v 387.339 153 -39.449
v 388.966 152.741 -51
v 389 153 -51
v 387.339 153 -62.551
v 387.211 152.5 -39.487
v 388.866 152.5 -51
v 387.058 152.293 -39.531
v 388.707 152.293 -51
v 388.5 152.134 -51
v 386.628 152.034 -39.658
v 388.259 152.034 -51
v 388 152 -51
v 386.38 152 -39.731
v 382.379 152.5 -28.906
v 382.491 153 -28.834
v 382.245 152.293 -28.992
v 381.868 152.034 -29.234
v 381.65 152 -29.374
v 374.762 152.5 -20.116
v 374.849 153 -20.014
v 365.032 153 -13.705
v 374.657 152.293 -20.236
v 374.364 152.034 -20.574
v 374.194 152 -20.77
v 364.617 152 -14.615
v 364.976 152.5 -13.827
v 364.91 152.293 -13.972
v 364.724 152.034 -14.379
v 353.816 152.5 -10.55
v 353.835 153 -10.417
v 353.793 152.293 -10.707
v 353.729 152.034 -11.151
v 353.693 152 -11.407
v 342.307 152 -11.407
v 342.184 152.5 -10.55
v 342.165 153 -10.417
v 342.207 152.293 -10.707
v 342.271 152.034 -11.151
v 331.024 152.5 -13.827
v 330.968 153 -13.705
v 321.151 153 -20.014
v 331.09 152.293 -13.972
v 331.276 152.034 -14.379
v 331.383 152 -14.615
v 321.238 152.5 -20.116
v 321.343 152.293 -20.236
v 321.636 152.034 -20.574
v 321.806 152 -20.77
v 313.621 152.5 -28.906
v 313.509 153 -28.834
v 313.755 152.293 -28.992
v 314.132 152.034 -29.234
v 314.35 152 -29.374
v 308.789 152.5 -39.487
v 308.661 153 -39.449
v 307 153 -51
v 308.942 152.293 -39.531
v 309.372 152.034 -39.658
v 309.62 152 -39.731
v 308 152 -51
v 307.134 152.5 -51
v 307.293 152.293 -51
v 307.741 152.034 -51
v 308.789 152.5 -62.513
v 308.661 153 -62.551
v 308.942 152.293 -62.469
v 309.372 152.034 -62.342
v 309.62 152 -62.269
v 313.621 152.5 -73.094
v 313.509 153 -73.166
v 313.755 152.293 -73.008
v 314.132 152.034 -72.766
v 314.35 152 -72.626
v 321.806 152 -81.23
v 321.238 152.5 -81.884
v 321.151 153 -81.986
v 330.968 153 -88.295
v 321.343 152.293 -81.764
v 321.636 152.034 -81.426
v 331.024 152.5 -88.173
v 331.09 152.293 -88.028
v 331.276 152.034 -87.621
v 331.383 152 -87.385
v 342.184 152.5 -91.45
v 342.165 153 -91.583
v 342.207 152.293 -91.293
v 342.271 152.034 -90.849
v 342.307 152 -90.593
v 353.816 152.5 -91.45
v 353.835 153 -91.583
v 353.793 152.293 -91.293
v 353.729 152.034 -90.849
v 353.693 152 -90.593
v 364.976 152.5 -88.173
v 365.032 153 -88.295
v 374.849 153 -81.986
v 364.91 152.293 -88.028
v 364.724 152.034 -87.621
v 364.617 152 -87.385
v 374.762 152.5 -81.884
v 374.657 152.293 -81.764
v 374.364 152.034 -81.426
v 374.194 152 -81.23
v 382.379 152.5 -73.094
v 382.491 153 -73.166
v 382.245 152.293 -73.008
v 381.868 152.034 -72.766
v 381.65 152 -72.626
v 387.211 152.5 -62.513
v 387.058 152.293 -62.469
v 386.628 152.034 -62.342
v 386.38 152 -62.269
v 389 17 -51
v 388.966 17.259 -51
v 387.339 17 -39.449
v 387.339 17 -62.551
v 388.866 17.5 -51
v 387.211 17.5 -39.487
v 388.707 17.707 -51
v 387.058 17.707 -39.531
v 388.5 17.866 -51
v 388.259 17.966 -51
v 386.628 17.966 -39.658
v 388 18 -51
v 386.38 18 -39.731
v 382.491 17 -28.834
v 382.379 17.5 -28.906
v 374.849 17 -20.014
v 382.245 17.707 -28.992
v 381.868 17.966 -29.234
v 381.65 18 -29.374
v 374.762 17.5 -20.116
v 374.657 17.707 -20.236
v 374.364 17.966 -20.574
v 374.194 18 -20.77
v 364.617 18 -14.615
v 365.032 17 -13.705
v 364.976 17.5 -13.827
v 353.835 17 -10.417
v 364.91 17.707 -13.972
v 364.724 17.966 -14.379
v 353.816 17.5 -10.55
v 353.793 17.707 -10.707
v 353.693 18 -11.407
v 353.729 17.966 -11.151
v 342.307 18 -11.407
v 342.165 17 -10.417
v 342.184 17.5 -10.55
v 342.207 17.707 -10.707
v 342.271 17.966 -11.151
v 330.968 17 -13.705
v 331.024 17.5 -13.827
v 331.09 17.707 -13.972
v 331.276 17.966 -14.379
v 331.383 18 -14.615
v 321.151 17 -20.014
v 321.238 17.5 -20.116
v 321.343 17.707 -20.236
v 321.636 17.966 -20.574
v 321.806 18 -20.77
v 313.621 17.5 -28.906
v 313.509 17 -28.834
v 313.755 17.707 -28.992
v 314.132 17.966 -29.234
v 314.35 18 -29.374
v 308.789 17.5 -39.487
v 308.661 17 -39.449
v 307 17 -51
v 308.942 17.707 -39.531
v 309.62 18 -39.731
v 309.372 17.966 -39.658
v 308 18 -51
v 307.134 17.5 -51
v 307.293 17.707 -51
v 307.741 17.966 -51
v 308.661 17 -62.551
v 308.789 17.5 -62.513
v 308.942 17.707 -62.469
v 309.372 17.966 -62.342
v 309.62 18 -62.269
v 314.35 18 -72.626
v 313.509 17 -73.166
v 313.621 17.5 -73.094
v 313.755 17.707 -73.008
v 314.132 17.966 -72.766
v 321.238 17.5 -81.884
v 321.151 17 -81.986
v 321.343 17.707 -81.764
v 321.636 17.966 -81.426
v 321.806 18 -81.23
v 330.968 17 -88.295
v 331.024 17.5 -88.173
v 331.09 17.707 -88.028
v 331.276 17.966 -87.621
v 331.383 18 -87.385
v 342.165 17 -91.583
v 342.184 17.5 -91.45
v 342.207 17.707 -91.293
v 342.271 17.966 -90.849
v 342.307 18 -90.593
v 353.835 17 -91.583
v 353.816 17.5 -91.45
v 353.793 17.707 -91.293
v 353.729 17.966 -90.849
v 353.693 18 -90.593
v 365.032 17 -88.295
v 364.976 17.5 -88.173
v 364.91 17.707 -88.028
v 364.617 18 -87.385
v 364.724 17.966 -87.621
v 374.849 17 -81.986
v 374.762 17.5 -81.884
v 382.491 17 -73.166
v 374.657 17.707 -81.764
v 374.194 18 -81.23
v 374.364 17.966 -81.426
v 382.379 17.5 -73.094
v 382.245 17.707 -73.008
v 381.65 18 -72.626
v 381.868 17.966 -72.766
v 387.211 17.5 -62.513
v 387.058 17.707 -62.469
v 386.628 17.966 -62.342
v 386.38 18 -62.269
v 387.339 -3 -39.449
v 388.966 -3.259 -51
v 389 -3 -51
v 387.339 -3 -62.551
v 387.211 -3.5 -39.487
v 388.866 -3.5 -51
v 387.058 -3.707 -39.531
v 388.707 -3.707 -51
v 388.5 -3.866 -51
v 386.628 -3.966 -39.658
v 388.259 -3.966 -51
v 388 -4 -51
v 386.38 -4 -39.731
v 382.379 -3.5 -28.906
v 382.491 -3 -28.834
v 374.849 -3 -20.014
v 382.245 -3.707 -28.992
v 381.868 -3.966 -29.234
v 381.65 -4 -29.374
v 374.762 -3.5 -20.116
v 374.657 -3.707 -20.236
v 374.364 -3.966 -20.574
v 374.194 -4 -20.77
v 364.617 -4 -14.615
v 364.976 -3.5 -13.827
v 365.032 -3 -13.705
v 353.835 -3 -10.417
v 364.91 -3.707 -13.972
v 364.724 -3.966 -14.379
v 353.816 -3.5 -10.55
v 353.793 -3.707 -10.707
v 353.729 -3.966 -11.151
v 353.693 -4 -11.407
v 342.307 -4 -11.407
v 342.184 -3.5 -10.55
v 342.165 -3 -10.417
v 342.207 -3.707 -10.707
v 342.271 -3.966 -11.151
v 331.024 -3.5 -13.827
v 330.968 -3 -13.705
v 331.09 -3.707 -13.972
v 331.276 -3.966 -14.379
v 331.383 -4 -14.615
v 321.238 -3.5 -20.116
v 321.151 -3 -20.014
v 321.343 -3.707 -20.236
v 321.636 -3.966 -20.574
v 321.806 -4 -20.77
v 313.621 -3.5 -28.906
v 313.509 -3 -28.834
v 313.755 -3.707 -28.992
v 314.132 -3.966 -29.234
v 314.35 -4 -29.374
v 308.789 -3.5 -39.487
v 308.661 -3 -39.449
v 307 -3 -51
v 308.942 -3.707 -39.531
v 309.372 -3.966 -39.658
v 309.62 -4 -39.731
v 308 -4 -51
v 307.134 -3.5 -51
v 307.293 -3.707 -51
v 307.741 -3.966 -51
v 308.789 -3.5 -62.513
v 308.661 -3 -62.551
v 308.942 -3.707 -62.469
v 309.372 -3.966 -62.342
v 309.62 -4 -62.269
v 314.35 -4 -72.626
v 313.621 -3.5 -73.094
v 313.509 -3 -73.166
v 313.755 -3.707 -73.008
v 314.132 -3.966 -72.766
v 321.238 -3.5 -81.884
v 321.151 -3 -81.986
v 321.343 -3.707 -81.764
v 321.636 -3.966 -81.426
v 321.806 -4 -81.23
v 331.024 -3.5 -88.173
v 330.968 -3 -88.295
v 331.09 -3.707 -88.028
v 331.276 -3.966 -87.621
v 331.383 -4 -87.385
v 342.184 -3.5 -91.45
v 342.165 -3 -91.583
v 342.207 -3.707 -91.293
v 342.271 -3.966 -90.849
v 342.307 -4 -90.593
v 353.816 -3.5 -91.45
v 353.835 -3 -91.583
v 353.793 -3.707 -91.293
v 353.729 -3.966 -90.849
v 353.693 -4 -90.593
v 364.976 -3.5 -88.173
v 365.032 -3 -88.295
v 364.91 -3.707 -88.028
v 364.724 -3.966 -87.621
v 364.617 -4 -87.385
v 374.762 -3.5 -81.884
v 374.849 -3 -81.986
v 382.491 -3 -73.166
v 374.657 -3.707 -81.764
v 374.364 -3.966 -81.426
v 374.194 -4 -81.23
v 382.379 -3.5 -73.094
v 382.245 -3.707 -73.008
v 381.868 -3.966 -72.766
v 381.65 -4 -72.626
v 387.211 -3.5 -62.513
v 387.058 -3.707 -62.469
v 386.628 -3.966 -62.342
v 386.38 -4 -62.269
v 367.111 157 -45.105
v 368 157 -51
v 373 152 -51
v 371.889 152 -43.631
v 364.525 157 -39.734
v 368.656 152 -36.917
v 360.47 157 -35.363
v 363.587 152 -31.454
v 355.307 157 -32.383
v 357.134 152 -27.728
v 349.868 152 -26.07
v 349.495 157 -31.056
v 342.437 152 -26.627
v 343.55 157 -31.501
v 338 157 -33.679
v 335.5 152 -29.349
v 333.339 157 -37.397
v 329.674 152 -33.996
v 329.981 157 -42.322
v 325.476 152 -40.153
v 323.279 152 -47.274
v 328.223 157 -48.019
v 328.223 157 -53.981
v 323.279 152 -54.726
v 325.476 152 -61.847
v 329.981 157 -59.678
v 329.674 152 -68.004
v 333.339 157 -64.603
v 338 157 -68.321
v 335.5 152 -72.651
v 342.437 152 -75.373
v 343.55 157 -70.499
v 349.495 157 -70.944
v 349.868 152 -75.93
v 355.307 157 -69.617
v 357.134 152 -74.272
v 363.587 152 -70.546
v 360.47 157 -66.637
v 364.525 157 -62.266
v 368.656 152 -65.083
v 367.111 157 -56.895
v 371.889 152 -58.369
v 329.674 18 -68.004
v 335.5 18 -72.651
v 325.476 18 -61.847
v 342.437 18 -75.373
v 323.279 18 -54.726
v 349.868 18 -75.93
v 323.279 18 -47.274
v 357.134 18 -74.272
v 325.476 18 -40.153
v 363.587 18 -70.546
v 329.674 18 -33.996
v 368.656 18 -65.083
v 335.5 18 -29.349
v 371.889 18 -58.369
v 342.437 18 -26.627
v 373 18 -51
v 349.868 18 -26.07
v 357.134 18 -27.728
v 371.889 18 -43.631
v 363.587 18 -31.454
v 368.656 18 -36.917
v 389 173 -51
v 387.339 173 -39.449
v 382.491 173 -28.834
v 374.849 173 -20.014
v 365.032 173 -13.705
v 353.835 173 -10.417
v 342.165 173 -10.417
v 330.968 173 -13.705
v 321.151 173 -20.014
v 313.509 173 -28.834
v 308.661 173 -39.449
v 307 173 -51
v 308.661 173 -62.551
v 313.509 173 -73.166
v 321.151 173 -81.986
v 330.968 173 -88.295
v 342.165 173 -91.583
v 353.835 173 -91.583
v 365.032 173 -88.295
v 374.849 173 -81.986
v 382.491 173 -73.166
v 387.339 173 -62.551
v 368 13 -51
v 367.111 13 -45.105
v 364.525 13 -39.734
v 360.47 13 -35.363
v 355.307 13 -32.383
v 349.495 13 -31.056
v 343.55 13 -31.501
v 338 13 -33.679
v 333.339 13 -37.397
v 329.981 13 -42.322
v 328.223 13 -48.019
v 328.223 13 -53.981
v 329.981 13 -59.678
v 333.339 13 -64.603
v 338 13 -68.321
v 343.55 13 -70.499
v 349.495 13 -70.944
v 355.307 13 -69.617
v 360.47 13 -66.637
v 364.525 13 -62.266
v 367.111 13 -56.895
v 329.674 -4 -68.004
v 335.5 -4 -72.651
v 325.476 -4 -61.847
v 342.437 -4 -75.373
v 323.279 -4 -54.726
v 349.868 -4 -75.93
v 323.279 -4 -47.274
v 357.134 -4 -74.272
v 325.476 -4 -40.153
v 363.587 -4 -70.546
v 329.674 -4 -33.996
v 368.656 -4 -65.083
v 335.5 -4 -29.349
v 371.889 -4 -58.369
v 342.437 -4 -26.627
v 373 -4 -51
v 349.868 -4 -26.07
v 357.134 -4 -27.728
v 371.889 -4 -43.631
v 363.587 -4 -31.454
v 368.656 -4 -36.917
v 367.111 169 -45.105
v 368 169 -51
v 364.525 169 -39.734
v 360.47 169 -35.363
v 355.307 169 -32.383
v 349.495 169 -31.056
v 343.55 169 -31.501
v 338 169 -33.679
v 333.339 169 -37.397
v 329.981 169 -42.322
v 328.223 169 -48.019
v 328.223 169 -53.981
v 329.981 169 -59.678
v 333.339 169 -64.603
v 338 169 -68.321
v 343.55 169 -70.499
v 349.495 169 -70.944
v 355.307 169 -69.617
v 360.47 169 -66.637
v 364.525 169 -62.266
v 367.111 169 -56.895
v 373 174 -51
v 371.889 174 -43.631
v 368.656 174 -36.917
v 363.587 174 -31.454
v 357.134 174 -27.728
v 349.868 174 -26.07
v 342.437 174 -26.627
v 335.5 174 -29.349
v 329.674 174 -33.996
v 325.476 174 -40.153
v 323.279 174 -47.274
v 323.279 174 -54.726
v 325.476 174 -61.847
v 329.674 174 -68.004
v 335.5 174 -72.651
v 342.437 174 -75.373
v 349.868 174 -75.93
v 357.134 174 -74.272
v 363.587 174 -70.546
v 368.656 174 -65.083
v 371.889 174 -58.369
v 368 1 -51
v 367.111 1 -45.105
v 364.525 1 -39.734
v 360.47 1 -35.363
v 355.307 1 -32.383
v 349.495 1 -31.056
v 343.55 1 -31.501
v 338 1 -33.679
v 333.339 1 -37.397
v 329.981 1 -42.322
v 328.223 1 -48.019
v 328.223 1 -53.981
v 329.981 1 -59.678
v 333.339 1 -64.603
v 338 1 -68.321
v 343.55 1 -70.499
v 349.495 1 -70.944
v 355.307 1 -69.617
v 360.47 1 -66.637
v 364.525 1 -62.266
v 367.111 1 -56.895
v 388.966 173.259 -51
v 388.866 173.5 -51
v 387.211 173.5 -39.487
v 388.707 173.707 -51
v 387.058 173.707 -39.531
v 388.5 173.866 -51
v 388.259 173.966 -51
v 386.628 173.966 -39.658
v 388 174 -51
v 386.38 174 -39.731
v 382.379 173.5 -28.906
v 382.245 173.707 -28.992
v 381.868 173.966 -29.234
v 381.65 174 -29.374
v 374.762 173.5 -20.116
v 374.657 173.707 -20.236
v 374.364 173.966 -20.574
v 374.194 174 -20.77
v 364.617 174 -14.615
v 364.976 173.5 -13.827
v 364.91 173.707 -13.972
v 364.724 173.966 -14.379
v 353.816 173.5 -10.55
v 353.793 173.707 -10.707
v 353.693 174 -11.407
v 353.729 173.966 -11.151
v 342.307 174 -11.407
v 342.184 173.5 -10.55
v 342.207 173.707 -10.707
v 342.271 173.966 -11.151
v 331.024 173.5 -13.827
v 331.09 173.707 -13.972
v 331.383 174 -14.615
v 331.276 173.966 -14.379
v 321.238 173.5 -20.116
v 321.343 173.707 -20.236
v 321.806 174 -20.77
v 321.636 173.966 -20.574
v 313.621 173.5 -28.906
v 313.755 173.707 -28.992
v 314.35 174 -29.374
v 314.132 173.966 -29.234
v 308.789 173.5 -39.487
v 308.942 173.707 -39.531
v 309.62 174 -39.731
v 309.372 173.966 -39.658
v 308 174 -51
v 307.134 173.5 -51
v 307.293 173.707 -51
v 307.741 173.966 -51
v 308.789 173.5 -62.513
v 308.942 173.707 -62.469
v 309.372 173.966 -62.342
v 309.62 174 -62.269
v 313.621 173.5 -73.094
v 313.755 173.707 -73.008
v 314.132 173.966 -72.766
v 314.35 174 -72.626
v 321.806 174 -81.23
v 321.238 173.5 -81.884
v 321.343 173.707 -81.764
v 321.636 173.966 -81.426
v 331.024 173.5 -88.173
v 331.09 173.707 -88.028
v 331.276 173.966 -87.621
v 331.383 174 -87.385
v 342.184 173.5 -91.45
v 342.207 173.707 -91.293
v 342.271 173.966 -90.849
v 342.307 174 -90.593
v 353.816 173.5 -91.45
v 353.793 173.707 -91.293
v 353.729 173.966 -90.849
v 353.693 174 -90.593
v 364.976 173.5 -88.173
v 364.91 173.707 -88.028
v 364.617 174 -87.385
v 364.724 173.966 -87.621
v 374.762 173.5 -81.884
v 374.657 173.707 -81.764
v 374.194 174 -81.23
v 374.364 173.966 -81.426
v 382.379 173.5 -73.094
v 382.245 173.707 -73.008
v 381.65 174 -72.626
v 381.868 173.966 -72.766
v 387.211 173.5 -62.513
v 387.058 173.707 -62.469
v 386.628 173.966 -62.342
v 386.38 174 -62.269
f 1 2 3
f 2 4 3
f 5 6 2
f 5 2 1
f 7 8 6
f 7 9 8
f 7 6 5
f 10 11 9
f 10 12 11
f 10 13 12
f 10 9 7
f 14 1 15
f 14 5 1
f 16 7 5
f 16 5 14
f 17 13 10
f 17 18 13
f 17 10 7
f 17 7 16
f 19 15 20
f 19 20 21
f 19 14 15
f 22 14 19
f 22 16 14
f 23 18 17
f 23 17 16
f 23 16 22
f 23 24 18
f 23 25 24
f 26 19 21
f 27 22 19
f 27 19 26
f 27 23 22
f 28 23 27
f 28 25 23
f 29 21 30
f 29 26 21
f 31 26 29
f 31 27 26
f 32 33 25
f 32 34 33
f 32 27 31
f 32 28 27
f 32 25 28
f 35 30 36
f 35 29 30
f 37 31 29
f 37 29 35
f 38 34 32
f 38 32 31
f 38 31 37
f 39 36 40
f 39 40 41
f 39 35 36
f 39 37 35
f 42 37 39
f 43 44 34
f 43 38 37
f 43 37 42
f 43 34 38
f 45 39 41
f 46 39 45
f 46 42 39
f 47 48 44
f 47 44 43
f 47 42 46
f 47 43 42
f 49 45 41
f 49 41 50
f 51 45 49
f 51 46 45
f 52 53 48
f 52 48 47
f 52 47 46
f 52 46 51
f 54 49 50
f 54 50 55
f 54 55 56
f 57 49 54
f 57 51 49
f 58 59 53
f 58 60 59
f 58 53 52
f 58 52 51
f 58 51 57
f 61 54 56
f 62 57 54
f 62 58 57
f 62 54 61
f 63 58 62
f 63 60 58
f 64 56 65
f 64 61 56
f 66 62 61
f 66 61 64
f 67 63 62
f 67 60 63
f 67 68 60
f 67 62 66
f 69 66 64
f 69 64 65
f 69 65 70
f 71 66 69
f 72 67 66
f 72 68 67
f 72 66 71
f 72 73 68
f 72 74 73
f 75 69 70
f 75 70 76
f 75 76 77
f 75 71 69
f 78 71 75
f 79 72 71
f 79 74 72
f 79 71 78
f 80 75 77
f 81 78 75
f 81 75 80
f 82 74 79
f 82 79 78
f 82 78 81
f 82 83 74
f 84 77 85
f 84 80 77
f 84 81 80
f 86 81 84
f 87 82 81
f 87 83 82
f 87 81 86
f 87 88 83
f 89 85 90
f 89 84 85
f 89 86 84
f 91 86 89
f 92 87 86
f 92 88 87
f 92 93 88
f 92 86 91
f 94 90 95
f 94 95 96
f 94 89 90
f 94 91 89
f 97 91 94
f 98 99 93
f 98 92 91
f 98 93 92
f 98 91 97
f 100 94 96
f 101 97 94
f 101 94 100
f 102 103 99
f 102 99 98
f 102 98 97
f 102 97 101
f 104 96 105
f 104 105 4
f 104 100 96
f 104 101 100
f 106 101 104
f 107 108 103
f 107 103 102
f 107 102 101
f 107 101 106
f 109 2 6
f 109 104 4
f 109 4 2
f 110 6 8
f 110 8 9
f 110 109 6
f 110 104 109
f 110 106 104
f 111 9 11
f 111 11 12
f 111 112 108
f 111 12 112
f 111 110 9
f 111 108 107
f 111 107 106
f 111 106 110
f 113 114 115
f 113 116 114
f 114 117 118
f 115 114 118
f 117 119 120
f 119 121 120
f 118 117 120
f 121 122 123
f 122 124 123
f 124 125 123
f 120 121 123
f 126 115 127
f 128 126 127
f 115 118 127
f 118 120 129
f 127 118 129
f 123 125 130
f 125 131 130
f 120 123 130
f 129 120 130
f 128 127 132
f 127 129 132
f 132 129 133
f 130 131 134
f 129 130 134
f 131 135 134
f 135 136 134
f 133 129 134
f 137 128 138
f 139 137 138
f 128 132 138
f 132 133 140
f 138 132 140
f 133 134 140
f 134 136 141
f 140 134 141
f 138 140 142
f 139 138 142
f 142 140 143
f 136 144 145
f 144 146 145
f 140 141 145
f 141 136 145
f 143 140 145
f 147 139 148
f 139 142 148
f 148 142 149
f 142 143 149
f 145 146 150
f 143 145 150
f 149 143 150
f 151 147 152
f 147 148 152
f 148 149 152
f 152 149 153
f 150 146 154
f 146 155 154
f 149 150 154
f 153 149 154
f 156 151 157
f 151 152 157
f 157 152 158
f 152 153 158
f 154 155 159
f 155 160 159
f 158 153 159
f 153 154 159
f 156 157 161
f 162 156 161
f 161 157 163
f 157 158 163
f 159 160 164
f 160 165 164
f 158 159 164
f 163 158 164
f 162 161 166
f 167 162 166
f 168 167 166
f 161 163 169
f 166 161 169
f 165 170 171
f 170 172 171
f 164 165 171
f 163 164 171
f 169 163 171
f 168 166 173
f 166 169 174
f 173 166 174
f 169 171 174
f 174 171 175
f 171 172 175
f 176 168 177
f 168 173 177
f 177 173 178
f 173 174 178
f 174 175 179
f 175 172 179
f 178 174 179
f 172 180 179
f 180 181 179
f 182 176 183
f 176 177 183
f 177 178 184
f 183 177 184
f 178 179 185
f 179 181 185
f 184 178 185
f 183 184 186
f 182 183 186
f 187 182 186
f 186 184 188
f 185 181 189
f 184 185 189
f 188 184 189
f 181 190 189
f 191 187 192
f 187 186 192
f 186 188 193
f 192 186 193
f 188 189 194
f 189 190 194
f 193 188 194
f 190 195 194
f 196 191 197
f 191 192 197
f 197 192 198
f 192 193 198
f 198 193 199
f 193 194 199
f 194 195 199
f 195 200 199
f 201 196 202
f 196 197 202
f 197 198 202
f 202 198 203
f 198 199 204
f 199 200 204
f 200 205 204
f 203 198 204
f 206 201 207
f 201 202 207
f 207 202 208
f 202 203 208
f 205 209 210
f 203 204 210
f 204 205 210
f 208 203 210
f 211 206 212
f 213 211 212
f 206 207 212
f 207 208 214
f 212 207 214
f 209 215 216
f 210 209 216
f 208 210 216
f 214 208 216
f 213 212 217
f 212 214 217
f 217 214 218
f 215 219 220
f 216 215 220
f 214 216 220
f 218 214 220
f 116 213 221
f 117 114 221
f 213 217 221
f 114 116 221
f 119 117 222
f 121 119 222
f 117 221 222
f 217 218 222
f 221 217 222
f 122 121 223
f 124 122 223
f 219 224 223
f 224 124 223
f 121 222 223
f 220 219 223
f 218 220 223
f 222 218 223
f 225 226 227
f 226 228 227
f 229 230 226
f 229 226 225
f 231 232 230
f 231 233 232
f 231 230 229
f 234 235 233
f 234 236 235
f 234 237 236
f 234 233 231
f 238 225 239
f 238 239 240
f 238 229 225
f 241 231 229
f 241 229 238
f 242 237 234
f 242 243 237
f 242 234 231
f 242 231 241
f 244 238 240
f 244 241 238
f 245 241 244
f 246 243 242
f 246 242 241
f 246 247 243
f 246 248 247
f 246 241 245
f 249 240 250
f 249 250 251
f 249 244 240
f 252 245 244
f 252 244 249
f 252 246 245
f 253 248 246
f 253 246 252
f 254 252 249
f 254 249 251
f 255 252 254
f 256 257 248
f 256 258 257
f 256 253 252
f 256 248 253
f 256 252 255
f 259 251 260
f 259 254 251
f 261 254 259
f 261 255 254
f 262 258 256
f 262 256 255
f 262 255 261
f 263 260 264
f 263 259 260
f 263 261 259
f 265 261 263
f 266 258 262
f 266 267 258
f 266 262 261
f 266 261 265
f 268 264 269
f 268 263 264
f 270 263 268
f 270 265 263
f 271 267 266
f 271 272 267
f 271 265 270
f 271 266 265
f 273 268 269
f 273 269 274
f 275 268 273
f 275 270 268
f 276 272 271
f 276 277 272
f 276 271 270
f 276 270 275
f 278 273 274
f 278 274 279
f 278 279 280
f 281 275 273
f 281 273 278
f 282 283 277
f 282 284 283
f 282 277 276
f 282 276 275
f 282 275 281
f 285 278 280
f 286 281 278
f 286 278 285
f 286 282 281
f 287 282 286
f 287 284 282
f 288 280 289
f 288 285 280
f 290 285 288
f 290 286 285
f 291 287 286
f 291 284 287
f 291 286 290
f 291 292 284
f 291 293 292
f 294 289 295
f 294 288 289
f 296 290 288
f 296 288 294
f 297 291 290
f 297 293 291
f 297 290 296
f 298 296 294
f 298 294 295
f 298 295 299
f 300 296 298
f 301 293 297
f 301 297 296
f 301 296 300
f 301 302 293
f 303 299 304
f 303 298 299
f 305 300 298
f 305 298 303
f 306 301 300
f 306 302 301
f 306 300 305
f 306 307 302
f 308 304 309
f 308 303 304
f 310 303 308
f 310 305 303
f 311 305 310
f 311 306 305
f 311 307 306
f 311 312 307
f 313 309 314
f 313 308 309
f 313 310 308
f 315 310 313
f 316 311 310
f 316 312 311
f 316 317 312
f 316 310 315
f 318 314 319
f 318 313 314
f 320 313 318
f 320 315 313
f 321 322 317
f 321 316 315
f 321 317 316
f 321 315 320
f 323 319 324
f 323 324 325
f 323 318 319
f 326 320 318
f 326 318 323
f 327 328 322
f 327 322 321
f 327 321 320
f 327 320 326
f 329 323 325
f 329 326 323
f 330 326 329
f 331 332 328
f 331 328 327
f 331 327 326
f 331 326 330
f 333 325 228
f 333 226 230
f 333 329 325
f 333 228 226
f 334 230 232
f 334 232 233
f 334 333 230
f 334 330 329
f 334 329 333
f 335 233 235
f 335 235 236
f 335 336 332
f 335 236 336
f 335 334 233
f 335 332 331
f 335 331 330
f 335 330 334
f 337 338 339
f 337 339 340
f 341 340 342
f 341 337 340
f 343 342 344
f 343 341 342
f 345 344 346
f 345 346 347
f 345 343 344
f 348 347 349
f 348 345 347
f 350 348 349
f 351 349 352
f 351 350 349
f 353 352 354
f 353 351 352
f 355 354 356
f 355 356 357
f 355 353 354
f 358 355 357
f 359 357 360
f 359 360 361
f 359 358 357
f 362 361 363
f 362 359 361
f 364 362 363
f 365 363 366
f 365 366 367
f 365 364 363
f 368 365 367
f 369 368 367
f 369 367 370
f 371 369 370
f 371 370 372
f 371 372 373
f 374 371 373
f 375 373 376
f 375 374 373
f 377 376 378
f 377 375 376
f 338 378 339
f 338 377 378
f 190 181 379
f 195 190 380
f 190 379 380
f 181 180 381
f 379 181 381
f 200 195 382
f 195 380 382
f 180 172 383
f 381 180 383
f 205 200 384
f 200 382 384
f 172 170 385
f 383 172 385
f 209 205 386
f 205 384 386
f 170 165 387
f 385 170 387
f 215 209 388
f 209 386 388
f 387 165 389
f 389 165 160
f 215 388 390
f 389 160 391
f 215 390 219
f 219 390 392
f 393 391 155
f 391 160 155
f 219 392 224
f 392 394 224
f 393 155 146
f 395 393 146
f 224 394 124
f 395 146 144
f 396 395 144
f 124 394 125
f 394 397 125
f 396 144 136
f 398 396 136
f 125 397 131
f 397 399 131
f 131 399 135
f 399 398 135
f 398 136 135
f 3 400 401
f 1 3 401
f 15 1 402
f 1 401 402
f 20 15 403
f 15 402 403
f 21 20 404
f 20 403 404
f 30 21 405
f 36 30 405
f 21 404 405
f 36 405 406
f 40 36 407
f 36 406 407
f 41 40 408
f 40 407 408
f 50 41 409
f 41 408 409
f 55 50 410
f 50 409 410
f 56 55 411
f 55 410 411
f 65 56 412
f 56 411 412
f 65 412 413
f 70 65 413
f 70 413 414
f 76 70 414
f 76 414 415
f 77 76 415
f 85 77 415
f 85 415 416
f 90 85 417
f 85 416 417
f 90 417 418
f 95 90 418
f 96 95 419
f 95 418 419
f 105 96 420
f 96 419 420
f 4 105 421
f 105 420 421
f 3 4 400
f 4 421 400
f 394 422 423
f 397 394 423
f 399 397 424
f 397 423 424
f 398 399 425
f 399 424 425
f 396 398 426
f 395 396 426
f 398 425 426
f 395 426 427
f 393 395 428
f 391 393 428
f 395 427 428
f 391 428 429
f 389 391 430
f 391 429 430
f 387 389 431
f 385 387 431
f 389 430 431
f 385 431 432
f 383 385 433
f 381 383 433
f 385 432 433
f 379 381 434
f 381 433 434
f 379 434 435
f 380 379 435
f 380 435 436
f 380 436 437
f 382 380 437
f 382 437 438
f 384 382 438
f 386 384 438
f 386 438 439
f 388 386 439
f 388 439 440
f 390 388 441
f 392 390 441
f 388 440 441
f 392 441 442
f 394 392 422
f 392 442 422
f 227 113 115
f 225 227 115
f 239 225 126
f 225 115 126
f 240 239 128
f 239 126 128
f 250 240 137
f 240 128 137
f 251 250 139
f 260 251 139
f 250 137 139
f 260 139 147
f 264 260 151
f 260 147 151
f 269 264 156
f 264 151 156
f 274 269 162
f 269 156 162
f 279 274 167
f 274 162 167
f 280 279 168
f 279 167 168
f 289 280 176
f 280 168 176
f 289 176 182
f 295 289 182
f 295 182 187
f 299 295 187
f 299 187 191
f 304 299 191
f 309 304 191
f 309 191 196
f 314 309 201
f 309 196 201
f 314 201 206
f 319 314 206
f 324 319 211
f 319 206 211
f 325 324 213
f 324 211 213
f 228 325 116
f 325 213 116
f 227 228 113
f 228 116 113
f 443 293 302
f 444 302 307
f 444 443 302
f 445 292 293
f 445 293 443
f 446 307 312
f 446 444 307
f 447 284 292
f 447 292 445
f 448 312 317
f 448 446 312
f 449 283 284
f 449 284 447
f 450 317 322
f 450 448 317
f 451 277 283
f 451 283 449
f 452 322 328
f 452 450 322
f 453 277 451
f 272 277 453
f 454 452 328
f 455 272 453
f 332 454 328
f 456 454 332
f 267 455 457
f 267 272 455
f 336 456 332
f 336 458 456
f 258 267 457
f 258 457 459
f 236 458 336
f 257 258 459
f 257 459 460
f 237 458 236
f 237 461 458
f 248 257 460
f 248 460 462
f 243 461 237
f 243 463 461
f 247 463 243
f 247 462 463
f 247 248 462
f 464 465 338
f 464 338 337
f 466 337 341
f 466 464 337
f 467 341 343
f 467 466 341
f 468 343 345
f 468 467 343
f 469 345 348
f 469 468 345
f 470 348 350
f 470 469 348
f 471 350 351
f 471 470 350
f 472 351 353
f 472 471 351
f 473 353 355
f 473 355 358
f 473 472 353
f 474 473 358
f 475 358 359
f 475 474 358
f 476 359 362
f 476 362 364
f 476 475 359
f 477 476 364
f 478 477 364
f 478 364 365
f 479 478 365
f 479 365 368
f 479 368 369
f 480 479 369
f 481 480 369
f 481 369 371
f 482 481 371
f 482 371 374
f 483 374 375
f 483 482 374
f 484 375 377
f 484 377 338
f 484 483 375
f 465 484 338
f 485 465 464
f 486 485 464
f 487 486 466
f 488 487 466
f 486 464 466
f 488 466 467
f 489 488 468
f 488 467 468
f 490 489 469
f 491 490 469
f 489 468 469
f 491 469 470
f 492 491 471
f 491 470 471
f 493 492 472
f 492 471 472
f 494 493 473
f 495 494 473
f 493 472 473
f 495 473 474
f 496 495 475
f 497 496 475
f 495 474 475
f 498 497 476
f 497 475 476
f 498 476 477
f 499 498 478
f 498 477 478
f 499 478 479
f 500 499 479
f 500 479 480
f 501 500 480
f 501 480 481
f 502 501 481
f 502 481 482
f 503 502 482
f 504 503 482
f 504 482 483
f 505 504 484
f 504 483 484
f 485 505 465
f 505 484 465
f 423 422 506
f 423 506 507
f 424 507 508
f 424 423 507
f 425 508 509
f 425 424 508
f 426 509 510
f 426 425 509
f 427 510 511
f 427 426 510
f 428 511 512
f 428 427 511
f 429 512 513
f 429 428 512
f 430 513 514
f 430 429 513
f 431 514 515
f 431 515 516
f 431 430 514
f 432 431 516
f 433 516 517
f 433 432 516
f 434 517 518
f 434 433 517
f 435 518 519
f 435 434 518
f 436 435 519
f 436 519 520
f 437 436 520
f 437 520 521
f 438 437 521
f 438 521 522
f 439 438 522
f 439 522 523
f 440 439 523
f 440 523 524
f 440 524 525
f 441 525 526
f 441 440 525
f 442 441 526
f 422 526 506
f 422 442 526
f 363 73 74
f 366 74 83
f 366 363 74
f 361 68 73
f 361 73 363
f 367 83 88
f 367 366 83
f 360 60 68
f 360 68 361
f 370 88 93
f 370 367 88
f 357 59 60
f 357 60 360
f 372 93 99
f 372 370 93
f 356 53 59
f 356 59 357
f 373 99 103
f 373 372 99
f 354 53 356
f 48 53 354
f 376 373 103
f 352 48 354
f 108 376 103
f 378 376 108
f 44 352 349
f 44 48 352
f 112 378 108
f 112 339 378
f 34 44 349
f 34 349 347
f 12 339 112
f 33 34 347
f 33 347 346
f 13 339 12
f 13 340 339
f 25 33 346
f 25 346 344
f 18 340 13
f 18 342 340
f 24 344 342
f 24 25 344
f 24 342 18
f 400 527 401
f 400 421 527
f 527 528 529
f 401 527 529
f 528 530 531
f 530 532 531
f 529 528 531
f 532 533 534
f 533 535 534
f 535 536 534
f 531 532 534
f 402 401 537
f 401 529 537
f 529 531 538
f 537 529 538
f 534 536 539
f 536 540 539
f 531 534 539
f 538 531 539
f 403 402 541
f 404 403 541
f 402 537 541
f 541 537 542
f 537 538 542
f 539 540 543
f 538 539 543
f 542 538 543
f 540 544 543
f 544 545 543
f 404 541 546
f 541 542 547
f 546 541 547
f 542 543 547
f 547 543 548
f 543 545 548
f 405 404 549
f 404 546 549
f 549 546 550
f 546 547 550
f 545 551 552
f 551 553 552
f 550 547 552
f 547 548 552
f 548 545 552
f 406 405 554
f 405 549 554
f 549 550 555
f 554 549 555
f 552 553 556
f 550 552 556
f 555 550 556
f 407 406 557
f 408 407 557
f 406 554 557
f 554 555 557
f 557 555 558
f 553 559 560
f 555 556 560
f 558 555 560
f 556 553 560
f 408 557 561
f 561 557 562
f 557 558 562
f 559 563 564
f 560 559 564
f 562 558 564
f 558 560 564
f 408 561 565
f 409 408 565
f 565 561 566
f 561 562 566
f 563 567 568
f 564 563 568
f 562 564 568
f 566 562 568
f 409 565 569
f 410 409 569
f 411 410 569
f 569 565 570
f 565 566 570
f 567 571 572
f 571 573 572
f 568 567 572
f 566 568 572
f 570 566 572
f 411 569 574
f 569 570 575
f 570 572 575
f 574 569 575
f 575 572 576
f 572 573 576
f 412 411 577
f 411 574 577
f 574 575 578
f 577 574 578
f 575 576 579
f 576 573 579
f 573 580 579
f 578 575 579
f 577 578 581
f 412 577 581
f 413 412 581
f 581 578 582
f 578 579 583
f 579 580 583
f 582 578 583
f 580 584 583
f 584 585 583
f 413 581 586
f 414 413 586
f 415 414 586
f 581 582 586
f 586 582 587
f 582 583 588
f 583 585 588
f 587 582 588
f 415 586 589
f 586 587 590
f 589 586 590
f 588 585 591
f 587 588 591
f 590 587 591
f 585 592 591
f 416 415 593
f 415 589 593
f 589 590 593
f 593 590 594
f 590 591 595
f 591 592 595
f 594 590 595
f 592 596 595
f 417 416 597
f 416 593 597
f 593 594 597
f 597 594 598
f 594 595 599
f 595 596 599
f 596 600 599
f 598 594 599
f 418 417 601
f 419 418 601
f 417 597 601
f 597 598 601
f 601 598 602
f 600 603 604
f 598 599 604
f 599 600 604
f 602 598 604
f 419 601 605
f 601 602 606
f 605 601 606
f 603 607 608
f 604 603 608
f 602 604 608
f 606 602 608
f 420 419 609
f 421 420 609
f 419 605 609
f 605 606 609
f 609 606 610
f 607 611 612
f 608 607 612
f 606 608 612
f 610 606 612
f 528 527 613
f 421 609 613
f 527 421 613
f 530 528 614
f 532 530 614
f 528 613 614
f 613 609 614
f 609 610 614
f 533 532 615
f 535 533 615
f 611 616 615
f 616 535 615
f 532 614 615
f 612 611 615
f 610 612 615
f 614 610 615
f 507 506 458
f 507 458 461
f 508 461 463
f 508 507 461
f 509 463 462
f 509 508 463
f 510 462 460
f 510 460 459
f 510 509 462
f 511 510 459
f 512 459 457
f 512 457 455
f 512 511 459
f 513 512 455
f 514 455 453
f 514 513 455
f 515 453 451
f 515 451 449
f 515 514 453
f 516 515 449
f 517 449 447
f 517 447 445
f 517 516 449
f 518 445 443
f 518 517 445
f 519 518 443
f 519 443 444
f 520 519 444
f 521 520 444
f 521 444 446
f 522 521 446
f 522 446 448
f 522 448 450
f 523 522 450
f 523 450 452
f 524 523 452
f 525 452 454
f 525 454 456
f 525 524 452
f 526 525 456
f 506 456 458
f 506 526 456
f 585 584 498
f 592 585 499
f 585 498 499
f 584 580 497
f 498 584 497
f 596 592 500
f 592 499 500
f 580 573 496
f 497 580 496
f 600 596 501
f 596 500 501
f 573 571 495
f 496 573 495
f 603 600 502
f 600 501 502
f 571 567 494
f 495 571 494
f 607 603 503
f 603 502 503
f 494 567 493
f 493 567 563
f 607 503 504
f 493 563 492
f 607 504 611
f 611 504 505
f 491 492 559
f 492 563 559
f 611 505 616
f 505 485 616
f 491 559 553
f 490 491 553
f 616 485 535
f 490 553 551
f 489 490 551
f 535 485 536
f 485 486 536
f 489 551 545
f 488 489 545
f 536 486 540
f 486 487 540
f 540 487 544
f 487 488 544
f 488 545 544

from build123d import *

# Parameters (mm, degrees)
CYLINDER290_R          = 20
CYLINDER290_DEPTH      = 22
CYLINDER290_ROLL_ANGLE = 90
CYLINDER289_R          = 41
CYLINDER289_DEPTH      = 22
CYLINDER289_ROLL_ANGLE = 90
FILLET267_R            = 1
CYLINDER291_R          = 20
CYLINDER291_DEPTH      = 22
CYLINDER291_ROLL_ANGLE = 90
CYLINDER288_R          = 41
CYLINDER288_DEPTH      = 22
CYLINDER288_ROLL_ANGLE = 90
FILLET266_R            = 1
CHAMFER056_SIZE        = 5


with BuildPart() as cylinder290:
    # Cylinder290 → Cylinder290 (new body)
    with BuildSketch(Plane.XY):
        Circle(CYLINDER290_R)
    extrude(amount=CYLINDER290_DEPTH)


with BuildPart() as cylinder290_1:
    # Cylinder290 roll: moved
    add(cylinder290.part.rotate(Axis((0, 0, 0), (1, 0, 0)), CYLINDER290_ROLL_ANGLE))


with BuildPart() as cylinder290_2:
    # Cylinder290 placement: moved
    add(cylinder290_1.part)


with BuildPart() as fillet267:
    # Cylinder289 → Cylinder289 (new body)
    with BuildSketch(Plane.XY):
        Circle(CYLINDER289_R)
    extrude(amount=CYLINDER289_DEPTH)


with BuildPart() as fillet267_1:
    # Cylinder289 roll: moved
    add(fillet267.part.rotate(Axis((0, 0, 0), (1, 0, 0)), CYLINDER289_ROLL_ANGLE))


with BuildPart() as fillet267_2:
    # Cylinder289 placement: moved
    add(fillet267_1.part)

    # Cut427: cut Cylinder290
    add(cylinder290_2.part, mode=Mode.SUBTRACT)

    # Fillet267
    fillet267_edges = [fillet267_2.edges().sort_by_distance(p)[0] for p in [
        (-41, -22, 0),
        (-41, 0, 0),
    ]]
    fillet(fillet267_edges, radius=FILLET267_R)


with BuildPart() as fillet267_3:
    # Fillet267 placement: moved
    add(fillet267_2.part.moved(Location((0, 174, 0))))


with BuildPart() as cylinder291:
    # Cylinder291 → Cylinder291 (new body)
    with BuildSketch(Plane.XY):
        Circle(CYLINDER291_R)
    extrude(amount=CYLINDER291_DEPTH)


with BuildPart() as cylinder291_1:
    # Cylinder291 roll: moved
    add(cylinder291.part.rotate(Axis((0, 0, 0), (1, 0, 0)), CYLINDER291_ROLL_ANGLE))


with BuildPart() as cylinder291_2:
    # Cylinder291 placement: moved
    add(cylinder291_1.part)


with BuildPart() as whees_middle:
    # Cylinder288 → Cylinder288 (new body)
    with BuildSketch(Plane.XY):
        Circle(CYLINDER288_R)
    extrude(amount=CYLINDER288_DEPTH)


with BuildPart() as whees_middle_1:
    # Cylinder288 roll: moved
    add(whees_middle.part.rotate(Axis((0, 0, 0), (1, 0, 0)), CYLINDER288_ROLL_ANGLE))


with BuildPart() as whees_middle_2:
    # Cylinder288 placement: moved
    add(whees_middle_1.part)

    # Cut428: cut Cylinder291
    add(cylinder291_2.part, mode=Mode.SUBTRACT)

    # Fillet266
    fillet266_edges = [whees_middle_2.edges().sort_by_distance(p)[0] for p in [
        (-41, -22, 0),
        (-41, 0, 0),
    ]]
    fillet(fillet266_edges, radius=FILLET266_R)


with BuildPart() as whees_middle_3:
    # Fillet266 placement: moved
    add(whees_middle_2.part.moved(Location((0, 18, 0))))

    # Fusion244: union Fillet267
    add(fillet267_3.part)


with BuildPart() as whees_middle_4:
    # Fusion244 placement: moved
    add(whees_middle_3.part.moved(Location((348, 0, -51))))

    # Chamfer056
    chamfer056_edges = [whees_middle_4.edges().sort_by_distance(p)[0] for p in [
        (328, 18, -51),
        (328, -4, -51),
        (328, 174, -51),
        (328, 152, -51),
    ]]
    chamfer(chamfer056_edges, length=CHAMFER056_SIZE)


solid = whees_middle_4.part
